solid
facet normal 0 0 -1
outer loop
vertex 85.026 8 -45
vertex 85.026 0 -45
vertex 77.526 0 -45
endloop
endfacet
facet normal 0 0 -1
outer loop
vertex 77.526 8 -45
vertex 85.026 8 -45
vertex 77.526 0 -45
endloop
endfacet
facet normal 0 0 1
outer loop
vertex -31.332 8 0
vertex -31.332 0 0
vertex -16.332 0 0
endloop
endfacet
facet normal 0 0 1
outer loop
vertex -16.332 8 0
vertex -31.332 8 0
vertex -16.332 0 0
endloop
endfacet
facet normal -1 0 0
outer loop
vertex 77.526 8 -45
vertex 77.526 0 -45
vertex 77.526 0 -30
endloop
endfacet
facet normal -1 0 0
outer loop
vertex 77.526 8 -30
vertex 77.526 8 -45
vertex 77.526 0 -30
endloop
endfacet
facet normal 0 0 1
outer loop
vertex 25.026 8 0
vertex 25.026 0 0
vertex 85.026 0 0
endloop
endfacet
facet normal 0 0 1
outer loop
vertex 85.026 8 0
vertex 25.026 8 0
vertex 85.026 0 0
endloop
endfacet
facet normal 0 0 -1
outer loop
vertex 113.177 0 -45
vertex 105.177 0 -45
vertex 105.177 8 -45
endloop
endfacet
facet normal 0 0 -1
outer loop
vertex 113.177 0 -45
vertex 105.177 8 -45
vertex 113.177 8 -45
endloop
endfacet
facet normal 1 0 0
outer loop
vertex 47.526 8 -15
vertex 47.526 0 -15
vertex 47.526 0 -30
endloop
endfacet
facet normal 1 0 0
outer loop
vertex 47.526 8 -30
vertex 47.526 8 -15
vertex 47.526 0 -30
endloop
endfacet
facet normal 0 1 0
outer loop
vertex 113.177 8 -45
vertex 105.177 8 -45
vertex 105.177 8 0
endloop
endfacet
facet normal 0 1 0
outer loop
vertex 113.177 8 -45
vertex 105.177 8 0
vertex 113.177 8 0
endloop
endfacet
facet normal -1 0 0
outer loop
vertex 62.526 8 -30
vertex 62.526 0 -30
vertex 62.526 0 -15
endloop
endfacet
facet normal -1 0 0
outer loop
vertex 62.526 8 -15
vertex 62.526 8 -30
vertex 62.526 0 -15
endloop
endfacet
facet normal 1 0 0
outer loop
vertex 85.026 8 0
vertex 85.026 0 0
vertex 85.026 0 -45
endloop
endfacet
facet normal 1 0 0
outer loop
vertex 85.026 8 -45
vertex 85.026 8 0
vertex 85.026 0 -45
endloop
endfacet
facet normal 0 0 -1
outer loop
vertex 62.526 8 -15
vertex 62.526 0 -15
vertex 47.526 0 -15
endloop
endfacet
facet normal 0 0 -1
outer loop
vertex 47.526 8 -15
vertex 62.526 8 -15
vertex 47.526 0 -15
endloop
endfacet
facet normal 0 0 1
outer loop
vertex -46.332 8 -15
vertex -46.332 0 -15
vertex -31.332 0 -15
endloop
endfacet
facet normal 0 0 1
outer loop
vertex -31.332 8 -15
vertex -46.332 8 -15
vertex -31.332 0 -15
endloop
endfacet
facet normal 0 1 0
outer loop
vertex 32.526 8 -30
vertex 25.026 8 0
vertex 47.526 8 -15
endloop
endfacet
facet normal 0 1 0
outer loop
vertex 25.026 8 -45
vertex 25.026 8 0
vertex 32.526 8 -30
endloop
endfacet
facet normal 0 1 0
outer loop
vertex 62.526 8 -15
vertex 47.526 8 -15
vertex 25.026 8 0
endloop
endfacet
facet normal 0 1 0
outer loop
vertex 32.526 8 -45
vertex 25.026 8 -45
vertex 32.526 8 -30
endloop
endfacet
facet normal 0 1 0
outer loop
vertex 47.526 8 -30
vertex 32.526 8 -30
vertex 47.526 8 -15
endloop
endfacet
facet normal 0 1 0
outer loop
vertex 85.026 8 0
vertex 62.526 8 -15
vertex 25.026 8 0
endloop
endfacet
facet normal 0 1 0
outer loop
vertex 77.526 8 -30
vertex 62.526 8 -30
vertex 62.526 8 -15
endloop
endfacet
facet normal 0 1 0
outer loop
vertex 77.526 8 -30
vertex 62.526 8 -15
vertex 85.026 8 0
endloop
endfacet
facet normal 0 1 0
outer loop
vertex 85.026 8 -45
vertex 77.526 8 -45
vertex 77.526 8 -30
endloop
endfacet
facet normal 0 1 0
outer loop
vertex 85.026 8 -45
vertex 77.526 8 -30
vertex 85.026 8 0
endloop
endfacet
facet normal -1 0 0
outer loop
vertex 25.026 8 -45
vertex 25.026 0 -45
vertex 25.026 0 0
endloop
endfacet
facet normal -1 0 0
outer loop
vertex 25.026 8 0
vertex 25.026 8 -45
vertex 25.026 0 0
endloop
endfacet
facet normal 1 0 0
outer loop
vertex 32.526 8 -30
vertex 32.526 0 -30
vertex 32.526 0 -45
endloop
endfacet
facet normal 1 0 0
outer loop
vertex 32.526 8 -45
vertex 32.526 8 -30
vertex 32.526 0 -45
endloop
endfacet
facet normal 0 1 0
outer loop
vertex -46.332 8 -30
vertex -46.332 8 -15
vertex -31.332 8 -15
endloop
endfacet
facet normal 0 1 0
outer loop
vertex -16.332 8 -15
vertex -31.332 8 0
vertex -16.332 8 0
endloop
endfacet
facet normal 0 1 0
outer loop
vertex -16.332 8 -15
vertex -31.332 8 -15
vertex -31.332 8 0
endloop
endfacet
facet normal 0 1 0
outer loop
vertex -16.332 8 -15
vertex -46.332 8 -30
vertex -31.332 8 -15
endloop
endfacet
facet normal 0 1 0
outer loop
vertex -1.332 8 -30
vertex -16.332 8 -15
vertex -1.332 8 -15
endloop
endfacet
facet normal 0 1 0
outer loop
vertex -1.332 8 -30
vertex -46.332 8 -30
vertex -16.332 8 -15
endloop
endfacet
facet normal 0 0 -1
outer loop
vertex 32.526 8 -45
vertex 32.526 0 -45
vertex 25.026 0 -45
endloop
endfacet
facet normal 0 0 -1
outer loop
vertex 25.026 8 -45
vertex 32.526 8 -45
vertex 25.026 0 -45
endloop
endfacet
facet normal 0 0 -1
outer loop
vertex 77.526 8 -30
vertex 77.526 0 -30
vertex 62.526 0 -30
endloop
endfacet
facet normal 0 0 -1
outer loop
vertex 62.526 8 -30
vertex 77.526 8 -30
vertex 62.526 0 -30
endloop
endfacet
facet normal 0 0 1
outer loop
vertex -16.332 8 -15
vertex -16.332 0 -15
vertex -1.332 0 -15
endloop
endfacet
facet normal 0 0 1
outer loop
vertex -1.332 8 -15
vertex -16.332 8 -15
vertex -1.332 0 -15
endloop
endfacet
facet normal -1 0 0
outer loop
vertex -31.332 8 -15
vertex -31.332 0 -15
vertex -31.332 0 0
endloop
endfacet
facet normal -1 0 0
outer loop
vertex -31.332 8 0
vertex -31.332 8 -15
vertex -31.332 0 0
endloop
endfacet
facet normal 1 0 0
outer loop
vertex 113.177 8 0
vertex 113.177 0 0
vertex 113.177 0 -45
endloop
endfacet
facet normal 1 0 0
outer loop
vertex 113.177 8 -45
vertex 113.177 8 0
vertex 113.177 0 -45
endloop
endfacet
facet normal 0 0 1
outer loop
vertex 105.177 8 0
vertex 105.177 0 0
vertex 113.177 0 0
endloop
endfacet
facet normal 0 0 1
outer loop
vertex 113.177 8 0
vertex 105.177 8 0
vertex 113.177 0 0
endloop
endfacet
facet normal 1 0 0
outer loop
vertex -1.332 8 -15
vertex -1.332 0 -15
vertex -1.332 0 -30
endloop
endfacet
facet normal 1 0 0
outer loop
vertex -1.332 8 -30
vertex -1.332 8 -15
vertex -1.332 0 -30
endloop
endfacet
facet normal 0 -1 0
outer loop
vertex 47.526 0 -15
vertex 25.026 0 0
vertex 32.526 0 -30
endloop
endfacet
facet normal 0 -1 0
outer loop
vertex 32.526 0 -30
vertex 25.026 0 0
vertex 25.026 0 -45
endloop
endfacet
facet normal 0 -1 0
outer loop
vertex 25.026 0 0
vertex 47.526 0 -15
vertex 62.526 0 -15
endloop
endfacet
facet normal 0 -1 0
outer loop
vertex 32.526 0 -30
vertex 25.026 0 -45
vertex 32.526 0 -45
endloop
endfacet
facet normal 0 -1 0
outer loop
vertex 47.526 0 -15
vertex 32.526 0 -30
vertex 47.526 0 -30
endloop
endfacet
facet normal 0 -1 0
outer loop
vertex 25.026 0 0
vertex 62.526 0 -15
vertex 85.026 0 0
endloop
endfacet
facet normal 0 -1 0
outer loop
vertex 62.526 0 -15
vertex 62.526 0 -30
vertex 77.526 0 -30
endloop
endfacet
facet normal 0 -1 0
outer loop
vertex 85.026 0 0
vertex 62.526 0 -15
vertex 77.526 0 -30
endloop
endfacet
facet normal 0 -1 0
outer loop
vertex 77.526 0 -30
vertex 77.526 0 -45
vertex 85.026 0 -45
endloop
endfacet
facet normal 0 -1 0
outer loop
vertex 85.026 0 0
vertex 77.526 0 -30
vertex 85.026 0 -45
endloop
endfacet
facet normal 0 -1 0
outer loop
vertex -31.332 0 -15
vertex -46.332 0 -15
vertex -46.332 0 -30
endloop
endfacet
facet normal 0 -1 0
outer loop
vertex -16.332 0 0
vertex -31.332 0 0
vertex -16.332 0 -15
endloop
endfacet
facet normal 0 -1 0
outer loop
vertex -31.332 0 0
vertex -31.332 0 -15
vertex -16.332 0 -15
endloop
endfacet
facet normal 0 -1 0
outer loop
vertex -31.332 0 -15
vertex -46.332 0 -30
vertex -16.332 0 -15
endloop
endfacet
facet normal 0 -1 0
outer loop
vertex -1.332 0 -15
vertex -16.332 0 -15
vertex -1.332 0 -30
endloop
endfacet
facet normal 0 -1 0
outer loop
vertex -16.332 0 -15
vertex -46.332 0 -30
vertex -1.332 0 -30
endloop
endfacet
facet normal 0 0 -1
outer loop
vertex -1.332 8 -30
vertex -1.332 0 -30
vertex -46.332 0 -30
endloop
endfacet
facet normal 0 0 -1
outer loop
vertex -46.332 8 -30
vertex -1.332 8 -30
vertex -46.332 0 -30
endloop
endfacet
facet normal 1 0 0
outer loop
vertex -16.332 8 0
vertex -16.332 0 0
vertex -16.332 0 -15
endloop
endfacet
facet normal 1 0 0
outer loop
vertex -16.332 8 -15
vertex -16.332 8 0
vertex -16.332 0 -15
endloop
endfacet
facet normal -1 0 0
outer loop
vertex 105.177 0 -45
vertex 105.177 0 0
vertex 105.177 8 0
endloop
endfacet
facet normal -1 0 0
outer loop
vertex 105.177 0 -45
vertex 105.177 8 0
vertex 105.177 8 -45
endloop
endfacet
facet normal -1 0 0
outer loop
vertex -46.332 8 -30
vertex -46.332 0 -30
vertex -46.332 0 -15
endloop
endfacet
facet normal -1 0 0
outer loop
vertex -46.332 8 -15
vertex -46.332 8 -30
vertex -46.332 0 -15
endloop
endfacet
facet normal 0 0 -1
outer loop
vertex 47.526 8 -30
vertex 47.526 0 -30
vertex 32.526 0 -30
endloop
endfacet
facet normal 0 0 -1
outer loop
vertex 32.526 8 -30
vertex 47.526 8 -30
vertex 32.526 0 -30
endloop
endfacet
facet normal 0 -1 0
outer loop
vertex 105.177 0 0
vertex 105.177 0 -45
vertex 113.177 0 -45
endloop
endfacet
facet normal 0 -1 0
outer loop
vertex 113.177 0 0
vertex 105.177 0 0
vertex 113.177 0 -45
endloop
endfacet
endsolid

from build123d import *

# Parameters (mm, degrees)
BOSS_EXTRUDE1_DEPTH   = 8
BOSS_EXTRUDE1_2_DEPTH = 8
SKETCH1_W             = 8
SKETCH1_H             = 45
BOSS_EXTRUDE1_3_DEPTH = 8


with BuildPart() as part:
    # Sketch1 → Boss-Extrude1 (new body)
    with BuildSketch(Plane(origin=(0, 0, 0), x_dir=(1, 0, 0), z_dir=(0, 1, 0))):
        Polygon((-31.331592689, 0), (-16.331592689, 0), (-16.331592689, 15), (-1.331592689, 15), (-1.331592689, 30), (-46.331592689, 30), (-46.331592689, 15), (-31.331592689, 15), align=None)
    extrude(amount=BOSS_EXTRUDE1_DEPTH)


with BuildPart() as body_2:
    # Sketch1 → Boss-Extrude1 2 (new body)
    with BuildSketch(Plane(origin=(0, 0, 0), x_dir=(1, 0, 0), z_dir=(0, 1, 0))):
        Polygon((25.026109661, 45), (25.026109661, 0), (85.026109661, 0), (85.026109661, 45), (77.526109661, 45), (77.526109661, 30), (62.526109661, 30), (62.526109661, 15), (47.526109661, 15), (47.526109661, 30), (32.526109661, 30), (32.526109661, 45), align=None)
    extrude(amount=BOSS_EXTRUDE1_2_DEPTH)


with BuildPart() as body_3:
    # Sketch1 → Boss-Extrude1 3 (new body)
    with BuildSketch(Plane(origin=(0, 0, 0), x_dir=(1, 0, 0), z_dir=(0, 1, 0))):
        with Locations((109.177341044, 22.5)):
            Rectangle(SKETCH1_W, SKETCH1_H)
    extrude(amount=BOSS_EXTRUDE1_3_DEPTH)


solid = Compound([part.part, body_2.part, body_3.part])
